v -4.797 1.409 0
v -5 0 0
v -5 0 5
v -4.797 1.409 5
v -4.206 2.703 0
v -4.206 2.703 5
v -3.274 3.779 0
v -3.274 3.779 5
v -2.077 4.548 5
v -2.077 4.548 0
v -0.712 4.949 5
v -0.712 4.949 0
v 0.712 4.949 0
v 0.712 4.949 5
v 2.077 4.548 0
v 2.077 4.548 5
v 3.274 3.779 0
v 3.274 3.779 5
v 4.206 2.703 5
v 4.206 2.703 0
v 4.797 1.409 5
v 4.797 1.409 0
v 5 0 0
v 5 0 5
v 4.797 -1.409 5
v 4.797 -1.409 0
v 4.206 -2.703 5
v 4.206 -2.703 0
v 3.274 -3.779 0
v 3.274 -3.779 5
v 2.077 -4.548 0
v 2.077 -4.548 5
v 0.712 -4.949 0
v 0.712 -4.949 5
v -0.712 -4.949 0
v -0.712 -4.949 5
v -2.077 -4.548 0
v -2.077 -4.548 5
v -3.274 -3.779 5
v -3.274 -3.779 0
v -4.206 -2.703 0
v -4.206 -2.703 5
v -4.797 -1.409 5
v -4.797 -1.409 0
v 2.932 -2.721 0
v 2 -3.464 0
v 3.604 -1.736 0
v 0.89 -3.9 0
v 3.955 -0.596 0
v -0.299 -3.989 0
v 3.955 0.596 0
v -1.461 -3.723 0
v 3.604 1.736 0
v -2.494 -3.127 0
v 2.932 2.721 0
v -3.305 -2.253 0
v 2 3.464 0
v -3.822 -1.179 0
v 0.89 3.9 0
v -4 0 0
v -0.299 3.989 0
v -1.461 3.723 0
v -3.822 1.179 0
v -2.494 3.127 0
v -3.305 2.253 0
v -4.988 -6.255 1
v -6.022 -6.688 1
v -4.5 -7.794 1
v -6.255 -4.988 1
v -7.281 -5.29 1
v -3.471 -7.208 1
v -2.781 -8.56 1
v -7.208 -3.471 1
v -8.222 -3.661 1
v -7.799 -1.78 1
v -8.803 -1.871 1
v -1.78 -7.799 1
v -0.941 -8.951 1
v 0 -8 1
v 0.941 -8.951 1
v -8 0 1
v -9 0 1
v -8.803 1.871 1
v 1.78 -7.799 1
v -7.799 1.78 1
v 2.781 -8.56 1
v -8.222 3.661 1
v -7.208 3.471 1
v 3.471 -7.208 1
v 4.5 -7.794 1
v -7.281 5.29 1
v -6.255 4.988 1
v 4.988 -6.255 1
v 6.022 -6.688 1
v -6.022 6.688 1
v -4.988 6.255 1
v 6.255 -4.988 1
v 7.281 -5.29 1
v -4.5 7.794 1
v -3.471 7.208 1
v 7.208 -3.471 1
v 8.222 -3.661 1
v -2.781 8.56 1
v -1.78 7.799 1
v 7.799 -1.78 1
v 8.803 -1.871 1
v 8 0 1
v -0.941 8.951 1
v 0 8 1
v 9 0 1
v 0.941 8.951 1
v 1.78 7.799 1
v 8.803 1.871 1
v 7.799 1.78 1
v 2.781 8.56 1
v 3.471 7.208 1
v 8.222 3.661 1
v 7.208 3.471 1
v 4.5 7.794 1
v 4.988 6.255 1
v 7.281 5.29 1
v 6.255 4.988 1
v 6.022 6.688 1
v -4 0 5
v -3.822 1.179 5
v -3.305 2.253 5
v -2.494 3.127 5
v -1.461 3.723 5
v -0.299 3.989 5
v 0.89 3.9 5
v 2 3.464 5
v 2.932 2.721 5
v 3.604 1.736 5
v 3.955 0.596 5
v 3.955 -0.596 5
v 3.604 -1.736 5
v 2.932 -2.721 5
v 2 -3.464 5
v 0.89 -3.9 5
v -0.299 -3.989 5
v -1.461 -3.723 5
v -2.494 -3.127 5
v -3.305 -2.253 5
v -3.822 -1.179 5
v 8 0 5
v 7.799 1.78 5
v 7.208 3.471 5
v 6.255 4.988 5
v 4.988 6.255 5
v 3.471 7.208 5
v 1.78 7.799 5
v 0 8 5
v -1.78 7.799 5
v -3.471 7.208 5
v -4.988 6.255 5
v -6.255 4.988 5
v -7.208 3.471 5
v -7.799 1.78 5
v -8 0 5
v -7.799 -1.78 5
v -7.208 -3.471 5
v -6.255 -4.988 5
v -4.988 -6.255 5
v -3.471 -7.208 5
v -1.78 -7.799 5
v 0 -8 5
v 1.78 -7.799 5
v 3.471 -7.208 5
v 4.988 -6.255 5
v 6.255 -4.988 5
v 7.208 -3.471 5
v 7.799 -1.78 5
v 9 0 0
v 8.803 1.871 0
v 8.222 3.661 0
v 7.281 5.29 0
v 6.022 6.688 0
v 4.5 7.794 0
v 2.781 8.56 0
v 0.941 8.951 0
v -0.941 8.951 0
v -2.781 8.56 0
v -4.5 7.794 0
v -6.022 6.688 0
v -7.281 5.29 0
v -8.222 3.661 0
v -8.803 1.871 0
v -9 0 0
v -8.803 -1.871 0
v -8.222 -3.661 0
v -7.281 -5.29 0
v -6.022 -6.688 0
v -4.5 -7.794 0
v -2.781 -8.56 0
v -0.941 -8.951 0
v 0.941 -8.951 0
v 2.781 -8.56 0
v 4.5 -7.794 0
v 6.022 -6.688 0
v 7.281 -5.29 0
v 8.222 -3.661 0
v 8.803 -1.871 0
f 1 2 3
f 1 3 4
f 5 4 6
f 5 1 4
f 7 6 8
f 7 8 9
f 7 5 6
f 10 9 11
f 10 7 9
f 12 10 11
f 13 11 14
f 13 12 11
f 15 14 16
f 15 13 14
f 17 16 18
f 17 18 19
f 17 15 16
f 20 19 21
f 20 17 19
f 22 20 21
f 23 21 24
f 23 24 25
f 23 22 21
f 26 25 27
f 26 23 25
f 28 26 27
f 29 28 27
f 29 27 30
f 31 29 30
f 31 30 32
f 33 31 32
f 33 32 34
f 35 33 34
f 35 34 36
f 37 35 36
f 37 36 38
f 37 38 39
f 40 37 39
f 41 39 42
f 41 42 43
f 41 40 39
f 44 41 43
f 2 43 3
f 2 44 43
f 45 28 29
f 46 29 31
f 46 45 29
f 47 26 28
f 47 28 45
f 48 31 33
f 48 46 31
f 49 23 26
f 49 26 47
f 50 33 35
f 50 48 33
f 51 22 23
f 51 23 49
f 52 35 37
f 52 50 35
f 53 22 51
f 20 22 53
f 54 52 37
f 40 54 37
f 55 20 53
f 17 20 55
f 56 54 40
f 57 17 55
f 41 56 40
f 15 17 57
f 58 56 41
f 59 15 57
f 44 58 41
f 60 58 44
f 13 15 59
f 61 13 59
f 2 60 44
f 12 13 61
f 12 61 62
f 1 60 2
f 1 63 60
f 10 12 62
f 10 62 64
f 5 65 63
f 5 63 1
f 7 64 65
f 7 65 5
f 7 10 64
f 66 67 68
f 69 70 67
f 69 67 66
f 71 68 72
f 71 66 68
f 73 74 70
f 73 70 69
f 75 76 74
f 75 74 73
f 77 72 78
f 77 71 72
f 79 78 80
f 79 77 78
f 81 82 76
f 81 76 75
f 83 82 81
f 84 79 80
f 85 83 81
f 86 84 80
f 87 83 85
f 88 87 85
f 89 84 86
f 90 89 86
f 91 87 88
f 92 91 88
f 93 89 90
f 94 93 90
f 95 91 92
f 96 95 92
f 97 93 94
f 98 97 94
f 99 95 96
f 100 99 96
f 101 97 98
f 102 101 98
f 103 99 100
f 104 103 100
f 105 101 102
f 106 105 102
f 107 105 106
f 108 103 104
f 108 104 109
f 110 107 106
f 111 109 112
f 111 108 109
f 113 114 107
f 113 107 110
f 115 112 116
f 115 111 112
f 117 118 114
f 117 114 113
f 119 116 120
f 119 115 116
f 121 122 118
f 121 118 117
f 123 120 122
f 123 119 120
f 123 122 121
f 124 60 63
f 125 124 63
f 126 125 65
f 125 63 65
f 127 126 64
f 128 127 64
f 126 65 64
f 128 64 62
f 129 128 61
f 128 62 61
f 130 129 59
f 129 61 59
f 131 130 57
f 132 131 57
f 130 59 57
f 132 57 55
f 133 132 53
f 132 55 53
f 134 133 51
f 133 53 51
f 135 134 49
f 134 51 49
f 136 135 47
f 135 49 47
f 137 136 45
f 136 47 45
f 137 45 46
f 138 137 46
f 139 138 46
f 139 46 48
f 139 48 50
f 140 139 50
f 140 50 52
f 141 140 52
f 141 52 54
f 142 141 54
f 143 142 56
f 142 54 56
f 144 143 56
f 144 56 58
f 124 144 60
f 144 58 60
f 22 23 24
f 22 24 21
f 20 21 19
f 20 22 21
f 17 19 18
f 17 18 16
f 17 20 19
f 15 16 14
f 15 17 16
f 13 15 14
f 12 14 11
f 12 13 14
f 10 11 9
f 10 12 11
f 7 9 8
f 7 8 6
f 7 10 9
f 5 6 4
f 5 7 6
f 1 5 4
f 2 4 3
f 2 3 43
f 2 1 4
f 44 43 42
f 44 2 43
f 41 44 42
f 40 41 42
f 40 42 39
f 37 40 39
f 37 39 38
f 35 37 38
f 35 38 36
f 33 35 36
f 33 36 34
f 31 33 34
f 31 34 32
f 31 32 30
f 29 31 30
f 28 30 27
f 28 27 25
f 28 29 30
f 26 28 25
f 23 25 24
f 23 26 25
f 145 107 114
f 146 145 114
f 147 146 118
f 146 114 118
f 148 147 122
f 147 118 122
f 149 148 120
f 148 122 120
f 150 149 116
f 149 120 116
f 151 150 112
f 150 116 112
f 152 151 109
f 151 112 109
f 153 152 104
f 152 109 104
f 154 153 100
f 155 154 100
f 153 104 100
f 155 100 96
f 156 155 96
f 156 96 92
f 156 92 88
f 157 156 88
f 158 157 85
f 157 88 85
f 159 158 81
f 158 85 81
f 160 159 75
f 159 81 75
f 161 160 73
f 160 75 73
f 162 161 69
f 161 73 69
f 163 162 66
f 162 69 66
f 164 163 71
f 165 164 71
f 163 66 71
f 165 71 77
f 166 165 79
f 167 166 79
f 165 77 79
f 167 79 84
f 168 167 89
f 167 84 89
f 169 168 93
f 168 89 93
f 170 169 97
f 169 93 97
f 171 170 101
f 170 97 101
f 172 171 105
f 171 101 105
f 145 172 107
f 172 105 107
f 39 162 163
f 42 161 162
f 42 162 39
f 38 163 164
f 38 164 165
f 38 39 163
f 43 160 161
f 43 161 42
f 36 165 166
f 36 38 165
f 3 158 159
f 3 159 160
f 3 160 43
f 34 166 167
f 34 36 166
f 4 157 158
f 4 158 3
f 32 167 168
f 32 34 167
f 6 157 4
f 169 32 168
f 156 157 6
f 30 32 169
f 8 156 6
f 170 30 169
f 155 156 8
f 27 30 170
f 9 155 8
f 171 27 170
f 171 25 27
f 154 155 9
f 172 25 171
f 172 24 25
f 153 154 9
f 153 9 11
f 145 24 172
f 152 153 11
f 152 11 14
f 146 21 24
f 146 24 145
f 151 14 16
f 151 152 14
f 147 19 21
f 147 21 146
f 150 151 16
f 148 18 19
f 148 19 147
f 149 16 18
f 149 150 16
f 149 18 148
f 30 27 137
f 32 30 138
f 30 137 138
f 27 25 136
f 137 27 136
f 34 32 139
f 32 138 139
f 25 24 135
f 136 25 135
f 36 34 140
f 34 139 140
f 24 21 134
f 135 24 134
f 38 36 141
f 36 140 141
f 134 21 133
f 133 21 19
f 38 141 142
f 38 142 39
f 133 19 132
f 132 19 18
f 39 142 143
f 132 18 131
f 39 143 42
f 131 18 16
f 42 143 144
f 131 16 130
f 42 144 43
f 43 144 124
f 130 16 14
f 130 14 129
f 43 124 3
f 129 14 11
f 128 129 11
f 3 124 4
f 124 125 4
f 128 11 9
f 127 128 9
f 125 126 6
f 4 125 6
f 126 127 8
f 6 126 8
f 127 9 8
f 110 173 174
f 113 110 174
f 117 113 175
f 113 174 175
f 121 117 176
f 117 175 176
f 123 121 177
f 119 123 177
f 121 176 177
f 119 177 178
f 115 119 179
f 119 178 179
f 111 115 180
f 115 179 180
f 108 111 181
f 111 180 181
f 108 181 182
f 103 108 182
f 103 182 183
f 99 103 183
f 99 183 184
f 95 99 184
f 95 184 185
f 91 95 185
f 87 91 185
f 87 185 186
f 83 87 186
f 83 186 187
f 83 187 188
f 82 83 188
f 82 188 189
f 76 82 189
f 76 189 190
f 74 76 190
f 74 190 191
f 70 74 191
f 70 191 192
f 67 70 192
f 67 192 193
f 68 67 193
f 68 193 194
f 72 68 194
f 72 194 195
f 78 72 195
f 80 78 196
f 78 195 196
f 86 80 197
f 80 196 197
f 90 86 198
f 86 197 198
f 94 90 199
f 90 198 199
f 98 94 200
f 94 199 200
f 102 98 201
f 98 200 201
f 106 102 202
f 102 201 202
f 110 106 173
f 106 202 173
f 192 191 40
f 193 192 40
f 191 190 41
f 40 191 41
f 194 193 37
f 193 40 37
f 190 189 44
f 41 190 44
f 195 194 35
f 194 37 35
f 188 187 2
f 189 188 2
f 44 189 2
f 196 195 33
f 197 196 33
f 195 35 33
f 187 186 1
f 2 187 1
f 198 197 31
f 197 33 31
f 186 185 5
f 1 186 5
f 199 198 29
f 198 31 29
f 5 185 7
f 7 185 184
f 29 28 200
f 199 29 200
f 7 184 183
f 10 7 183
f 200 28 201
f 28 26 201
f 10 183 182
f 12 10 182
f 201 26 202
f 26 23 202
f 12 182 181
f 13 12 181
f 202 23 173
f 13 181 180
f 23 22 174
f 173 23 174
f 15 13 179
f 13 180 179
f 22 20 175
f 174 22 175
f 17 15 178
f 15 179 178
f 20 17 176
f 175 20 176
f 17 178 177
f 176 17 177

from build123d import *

# Parameters (mm, degrees)
SKETCH_1_R          = 9
SKETCH_1_R_2        = 5
EXTRUDE_1_DEPTH     = 5
CUT_EXTRUDE_START   = -4
SKETCH_2_R          = 9
SKETCH_2_R_2        = 8
CUT_EXTRUDE_1_DEPTH = 4
SKETCH_3_R          = 5
SKETCH_3_R_2        = 4
EXTRUDE_2_DEPTH     = 5


with BuildPart() as part:
    # Эскиз1 → Бобышка-Вытянуть1 (new body)
    with BuildSketch(Plane.XY):
        Circle(SKETCH_1_R)
        Circle(SKETCH_1_R_2, mode=Mode.SUBTRACT)
    extrude(amount=EXTRUDE_1_DEPTH)

    # Эскиз2 → Вырез-Вытянуть1 (cut)
    with BuildSketch(Plane.XY.offset(5).offset(CUT_EXTRUDE_START)):
        Circle(SKETCH_2_R)
        Circle(SKETCH_2_R_2, mode=Mode.SUBTRACT)
    extrude(amount=CUT_EXTRUDE_1_DEPTH, mode=Mode.SUBTRACT)


with BuildPart() as body_2:
    # Эскиз3 → Бобышка-Вытянуть2 (new body)
    with BuildSketch(Plane(origin=(0, 0, 0), x_dir=(-1, 0, 0), z_dir=(0, 0, -1))):
        Circle(SKETCH_3_R)
        Circle(SKETCH_3_R_2, mode=Mode.SUBTRACT)
    extrude(amount=-EXTRUDE_2_DEPTH)


solid = Compound([part.part, body_2.part])
